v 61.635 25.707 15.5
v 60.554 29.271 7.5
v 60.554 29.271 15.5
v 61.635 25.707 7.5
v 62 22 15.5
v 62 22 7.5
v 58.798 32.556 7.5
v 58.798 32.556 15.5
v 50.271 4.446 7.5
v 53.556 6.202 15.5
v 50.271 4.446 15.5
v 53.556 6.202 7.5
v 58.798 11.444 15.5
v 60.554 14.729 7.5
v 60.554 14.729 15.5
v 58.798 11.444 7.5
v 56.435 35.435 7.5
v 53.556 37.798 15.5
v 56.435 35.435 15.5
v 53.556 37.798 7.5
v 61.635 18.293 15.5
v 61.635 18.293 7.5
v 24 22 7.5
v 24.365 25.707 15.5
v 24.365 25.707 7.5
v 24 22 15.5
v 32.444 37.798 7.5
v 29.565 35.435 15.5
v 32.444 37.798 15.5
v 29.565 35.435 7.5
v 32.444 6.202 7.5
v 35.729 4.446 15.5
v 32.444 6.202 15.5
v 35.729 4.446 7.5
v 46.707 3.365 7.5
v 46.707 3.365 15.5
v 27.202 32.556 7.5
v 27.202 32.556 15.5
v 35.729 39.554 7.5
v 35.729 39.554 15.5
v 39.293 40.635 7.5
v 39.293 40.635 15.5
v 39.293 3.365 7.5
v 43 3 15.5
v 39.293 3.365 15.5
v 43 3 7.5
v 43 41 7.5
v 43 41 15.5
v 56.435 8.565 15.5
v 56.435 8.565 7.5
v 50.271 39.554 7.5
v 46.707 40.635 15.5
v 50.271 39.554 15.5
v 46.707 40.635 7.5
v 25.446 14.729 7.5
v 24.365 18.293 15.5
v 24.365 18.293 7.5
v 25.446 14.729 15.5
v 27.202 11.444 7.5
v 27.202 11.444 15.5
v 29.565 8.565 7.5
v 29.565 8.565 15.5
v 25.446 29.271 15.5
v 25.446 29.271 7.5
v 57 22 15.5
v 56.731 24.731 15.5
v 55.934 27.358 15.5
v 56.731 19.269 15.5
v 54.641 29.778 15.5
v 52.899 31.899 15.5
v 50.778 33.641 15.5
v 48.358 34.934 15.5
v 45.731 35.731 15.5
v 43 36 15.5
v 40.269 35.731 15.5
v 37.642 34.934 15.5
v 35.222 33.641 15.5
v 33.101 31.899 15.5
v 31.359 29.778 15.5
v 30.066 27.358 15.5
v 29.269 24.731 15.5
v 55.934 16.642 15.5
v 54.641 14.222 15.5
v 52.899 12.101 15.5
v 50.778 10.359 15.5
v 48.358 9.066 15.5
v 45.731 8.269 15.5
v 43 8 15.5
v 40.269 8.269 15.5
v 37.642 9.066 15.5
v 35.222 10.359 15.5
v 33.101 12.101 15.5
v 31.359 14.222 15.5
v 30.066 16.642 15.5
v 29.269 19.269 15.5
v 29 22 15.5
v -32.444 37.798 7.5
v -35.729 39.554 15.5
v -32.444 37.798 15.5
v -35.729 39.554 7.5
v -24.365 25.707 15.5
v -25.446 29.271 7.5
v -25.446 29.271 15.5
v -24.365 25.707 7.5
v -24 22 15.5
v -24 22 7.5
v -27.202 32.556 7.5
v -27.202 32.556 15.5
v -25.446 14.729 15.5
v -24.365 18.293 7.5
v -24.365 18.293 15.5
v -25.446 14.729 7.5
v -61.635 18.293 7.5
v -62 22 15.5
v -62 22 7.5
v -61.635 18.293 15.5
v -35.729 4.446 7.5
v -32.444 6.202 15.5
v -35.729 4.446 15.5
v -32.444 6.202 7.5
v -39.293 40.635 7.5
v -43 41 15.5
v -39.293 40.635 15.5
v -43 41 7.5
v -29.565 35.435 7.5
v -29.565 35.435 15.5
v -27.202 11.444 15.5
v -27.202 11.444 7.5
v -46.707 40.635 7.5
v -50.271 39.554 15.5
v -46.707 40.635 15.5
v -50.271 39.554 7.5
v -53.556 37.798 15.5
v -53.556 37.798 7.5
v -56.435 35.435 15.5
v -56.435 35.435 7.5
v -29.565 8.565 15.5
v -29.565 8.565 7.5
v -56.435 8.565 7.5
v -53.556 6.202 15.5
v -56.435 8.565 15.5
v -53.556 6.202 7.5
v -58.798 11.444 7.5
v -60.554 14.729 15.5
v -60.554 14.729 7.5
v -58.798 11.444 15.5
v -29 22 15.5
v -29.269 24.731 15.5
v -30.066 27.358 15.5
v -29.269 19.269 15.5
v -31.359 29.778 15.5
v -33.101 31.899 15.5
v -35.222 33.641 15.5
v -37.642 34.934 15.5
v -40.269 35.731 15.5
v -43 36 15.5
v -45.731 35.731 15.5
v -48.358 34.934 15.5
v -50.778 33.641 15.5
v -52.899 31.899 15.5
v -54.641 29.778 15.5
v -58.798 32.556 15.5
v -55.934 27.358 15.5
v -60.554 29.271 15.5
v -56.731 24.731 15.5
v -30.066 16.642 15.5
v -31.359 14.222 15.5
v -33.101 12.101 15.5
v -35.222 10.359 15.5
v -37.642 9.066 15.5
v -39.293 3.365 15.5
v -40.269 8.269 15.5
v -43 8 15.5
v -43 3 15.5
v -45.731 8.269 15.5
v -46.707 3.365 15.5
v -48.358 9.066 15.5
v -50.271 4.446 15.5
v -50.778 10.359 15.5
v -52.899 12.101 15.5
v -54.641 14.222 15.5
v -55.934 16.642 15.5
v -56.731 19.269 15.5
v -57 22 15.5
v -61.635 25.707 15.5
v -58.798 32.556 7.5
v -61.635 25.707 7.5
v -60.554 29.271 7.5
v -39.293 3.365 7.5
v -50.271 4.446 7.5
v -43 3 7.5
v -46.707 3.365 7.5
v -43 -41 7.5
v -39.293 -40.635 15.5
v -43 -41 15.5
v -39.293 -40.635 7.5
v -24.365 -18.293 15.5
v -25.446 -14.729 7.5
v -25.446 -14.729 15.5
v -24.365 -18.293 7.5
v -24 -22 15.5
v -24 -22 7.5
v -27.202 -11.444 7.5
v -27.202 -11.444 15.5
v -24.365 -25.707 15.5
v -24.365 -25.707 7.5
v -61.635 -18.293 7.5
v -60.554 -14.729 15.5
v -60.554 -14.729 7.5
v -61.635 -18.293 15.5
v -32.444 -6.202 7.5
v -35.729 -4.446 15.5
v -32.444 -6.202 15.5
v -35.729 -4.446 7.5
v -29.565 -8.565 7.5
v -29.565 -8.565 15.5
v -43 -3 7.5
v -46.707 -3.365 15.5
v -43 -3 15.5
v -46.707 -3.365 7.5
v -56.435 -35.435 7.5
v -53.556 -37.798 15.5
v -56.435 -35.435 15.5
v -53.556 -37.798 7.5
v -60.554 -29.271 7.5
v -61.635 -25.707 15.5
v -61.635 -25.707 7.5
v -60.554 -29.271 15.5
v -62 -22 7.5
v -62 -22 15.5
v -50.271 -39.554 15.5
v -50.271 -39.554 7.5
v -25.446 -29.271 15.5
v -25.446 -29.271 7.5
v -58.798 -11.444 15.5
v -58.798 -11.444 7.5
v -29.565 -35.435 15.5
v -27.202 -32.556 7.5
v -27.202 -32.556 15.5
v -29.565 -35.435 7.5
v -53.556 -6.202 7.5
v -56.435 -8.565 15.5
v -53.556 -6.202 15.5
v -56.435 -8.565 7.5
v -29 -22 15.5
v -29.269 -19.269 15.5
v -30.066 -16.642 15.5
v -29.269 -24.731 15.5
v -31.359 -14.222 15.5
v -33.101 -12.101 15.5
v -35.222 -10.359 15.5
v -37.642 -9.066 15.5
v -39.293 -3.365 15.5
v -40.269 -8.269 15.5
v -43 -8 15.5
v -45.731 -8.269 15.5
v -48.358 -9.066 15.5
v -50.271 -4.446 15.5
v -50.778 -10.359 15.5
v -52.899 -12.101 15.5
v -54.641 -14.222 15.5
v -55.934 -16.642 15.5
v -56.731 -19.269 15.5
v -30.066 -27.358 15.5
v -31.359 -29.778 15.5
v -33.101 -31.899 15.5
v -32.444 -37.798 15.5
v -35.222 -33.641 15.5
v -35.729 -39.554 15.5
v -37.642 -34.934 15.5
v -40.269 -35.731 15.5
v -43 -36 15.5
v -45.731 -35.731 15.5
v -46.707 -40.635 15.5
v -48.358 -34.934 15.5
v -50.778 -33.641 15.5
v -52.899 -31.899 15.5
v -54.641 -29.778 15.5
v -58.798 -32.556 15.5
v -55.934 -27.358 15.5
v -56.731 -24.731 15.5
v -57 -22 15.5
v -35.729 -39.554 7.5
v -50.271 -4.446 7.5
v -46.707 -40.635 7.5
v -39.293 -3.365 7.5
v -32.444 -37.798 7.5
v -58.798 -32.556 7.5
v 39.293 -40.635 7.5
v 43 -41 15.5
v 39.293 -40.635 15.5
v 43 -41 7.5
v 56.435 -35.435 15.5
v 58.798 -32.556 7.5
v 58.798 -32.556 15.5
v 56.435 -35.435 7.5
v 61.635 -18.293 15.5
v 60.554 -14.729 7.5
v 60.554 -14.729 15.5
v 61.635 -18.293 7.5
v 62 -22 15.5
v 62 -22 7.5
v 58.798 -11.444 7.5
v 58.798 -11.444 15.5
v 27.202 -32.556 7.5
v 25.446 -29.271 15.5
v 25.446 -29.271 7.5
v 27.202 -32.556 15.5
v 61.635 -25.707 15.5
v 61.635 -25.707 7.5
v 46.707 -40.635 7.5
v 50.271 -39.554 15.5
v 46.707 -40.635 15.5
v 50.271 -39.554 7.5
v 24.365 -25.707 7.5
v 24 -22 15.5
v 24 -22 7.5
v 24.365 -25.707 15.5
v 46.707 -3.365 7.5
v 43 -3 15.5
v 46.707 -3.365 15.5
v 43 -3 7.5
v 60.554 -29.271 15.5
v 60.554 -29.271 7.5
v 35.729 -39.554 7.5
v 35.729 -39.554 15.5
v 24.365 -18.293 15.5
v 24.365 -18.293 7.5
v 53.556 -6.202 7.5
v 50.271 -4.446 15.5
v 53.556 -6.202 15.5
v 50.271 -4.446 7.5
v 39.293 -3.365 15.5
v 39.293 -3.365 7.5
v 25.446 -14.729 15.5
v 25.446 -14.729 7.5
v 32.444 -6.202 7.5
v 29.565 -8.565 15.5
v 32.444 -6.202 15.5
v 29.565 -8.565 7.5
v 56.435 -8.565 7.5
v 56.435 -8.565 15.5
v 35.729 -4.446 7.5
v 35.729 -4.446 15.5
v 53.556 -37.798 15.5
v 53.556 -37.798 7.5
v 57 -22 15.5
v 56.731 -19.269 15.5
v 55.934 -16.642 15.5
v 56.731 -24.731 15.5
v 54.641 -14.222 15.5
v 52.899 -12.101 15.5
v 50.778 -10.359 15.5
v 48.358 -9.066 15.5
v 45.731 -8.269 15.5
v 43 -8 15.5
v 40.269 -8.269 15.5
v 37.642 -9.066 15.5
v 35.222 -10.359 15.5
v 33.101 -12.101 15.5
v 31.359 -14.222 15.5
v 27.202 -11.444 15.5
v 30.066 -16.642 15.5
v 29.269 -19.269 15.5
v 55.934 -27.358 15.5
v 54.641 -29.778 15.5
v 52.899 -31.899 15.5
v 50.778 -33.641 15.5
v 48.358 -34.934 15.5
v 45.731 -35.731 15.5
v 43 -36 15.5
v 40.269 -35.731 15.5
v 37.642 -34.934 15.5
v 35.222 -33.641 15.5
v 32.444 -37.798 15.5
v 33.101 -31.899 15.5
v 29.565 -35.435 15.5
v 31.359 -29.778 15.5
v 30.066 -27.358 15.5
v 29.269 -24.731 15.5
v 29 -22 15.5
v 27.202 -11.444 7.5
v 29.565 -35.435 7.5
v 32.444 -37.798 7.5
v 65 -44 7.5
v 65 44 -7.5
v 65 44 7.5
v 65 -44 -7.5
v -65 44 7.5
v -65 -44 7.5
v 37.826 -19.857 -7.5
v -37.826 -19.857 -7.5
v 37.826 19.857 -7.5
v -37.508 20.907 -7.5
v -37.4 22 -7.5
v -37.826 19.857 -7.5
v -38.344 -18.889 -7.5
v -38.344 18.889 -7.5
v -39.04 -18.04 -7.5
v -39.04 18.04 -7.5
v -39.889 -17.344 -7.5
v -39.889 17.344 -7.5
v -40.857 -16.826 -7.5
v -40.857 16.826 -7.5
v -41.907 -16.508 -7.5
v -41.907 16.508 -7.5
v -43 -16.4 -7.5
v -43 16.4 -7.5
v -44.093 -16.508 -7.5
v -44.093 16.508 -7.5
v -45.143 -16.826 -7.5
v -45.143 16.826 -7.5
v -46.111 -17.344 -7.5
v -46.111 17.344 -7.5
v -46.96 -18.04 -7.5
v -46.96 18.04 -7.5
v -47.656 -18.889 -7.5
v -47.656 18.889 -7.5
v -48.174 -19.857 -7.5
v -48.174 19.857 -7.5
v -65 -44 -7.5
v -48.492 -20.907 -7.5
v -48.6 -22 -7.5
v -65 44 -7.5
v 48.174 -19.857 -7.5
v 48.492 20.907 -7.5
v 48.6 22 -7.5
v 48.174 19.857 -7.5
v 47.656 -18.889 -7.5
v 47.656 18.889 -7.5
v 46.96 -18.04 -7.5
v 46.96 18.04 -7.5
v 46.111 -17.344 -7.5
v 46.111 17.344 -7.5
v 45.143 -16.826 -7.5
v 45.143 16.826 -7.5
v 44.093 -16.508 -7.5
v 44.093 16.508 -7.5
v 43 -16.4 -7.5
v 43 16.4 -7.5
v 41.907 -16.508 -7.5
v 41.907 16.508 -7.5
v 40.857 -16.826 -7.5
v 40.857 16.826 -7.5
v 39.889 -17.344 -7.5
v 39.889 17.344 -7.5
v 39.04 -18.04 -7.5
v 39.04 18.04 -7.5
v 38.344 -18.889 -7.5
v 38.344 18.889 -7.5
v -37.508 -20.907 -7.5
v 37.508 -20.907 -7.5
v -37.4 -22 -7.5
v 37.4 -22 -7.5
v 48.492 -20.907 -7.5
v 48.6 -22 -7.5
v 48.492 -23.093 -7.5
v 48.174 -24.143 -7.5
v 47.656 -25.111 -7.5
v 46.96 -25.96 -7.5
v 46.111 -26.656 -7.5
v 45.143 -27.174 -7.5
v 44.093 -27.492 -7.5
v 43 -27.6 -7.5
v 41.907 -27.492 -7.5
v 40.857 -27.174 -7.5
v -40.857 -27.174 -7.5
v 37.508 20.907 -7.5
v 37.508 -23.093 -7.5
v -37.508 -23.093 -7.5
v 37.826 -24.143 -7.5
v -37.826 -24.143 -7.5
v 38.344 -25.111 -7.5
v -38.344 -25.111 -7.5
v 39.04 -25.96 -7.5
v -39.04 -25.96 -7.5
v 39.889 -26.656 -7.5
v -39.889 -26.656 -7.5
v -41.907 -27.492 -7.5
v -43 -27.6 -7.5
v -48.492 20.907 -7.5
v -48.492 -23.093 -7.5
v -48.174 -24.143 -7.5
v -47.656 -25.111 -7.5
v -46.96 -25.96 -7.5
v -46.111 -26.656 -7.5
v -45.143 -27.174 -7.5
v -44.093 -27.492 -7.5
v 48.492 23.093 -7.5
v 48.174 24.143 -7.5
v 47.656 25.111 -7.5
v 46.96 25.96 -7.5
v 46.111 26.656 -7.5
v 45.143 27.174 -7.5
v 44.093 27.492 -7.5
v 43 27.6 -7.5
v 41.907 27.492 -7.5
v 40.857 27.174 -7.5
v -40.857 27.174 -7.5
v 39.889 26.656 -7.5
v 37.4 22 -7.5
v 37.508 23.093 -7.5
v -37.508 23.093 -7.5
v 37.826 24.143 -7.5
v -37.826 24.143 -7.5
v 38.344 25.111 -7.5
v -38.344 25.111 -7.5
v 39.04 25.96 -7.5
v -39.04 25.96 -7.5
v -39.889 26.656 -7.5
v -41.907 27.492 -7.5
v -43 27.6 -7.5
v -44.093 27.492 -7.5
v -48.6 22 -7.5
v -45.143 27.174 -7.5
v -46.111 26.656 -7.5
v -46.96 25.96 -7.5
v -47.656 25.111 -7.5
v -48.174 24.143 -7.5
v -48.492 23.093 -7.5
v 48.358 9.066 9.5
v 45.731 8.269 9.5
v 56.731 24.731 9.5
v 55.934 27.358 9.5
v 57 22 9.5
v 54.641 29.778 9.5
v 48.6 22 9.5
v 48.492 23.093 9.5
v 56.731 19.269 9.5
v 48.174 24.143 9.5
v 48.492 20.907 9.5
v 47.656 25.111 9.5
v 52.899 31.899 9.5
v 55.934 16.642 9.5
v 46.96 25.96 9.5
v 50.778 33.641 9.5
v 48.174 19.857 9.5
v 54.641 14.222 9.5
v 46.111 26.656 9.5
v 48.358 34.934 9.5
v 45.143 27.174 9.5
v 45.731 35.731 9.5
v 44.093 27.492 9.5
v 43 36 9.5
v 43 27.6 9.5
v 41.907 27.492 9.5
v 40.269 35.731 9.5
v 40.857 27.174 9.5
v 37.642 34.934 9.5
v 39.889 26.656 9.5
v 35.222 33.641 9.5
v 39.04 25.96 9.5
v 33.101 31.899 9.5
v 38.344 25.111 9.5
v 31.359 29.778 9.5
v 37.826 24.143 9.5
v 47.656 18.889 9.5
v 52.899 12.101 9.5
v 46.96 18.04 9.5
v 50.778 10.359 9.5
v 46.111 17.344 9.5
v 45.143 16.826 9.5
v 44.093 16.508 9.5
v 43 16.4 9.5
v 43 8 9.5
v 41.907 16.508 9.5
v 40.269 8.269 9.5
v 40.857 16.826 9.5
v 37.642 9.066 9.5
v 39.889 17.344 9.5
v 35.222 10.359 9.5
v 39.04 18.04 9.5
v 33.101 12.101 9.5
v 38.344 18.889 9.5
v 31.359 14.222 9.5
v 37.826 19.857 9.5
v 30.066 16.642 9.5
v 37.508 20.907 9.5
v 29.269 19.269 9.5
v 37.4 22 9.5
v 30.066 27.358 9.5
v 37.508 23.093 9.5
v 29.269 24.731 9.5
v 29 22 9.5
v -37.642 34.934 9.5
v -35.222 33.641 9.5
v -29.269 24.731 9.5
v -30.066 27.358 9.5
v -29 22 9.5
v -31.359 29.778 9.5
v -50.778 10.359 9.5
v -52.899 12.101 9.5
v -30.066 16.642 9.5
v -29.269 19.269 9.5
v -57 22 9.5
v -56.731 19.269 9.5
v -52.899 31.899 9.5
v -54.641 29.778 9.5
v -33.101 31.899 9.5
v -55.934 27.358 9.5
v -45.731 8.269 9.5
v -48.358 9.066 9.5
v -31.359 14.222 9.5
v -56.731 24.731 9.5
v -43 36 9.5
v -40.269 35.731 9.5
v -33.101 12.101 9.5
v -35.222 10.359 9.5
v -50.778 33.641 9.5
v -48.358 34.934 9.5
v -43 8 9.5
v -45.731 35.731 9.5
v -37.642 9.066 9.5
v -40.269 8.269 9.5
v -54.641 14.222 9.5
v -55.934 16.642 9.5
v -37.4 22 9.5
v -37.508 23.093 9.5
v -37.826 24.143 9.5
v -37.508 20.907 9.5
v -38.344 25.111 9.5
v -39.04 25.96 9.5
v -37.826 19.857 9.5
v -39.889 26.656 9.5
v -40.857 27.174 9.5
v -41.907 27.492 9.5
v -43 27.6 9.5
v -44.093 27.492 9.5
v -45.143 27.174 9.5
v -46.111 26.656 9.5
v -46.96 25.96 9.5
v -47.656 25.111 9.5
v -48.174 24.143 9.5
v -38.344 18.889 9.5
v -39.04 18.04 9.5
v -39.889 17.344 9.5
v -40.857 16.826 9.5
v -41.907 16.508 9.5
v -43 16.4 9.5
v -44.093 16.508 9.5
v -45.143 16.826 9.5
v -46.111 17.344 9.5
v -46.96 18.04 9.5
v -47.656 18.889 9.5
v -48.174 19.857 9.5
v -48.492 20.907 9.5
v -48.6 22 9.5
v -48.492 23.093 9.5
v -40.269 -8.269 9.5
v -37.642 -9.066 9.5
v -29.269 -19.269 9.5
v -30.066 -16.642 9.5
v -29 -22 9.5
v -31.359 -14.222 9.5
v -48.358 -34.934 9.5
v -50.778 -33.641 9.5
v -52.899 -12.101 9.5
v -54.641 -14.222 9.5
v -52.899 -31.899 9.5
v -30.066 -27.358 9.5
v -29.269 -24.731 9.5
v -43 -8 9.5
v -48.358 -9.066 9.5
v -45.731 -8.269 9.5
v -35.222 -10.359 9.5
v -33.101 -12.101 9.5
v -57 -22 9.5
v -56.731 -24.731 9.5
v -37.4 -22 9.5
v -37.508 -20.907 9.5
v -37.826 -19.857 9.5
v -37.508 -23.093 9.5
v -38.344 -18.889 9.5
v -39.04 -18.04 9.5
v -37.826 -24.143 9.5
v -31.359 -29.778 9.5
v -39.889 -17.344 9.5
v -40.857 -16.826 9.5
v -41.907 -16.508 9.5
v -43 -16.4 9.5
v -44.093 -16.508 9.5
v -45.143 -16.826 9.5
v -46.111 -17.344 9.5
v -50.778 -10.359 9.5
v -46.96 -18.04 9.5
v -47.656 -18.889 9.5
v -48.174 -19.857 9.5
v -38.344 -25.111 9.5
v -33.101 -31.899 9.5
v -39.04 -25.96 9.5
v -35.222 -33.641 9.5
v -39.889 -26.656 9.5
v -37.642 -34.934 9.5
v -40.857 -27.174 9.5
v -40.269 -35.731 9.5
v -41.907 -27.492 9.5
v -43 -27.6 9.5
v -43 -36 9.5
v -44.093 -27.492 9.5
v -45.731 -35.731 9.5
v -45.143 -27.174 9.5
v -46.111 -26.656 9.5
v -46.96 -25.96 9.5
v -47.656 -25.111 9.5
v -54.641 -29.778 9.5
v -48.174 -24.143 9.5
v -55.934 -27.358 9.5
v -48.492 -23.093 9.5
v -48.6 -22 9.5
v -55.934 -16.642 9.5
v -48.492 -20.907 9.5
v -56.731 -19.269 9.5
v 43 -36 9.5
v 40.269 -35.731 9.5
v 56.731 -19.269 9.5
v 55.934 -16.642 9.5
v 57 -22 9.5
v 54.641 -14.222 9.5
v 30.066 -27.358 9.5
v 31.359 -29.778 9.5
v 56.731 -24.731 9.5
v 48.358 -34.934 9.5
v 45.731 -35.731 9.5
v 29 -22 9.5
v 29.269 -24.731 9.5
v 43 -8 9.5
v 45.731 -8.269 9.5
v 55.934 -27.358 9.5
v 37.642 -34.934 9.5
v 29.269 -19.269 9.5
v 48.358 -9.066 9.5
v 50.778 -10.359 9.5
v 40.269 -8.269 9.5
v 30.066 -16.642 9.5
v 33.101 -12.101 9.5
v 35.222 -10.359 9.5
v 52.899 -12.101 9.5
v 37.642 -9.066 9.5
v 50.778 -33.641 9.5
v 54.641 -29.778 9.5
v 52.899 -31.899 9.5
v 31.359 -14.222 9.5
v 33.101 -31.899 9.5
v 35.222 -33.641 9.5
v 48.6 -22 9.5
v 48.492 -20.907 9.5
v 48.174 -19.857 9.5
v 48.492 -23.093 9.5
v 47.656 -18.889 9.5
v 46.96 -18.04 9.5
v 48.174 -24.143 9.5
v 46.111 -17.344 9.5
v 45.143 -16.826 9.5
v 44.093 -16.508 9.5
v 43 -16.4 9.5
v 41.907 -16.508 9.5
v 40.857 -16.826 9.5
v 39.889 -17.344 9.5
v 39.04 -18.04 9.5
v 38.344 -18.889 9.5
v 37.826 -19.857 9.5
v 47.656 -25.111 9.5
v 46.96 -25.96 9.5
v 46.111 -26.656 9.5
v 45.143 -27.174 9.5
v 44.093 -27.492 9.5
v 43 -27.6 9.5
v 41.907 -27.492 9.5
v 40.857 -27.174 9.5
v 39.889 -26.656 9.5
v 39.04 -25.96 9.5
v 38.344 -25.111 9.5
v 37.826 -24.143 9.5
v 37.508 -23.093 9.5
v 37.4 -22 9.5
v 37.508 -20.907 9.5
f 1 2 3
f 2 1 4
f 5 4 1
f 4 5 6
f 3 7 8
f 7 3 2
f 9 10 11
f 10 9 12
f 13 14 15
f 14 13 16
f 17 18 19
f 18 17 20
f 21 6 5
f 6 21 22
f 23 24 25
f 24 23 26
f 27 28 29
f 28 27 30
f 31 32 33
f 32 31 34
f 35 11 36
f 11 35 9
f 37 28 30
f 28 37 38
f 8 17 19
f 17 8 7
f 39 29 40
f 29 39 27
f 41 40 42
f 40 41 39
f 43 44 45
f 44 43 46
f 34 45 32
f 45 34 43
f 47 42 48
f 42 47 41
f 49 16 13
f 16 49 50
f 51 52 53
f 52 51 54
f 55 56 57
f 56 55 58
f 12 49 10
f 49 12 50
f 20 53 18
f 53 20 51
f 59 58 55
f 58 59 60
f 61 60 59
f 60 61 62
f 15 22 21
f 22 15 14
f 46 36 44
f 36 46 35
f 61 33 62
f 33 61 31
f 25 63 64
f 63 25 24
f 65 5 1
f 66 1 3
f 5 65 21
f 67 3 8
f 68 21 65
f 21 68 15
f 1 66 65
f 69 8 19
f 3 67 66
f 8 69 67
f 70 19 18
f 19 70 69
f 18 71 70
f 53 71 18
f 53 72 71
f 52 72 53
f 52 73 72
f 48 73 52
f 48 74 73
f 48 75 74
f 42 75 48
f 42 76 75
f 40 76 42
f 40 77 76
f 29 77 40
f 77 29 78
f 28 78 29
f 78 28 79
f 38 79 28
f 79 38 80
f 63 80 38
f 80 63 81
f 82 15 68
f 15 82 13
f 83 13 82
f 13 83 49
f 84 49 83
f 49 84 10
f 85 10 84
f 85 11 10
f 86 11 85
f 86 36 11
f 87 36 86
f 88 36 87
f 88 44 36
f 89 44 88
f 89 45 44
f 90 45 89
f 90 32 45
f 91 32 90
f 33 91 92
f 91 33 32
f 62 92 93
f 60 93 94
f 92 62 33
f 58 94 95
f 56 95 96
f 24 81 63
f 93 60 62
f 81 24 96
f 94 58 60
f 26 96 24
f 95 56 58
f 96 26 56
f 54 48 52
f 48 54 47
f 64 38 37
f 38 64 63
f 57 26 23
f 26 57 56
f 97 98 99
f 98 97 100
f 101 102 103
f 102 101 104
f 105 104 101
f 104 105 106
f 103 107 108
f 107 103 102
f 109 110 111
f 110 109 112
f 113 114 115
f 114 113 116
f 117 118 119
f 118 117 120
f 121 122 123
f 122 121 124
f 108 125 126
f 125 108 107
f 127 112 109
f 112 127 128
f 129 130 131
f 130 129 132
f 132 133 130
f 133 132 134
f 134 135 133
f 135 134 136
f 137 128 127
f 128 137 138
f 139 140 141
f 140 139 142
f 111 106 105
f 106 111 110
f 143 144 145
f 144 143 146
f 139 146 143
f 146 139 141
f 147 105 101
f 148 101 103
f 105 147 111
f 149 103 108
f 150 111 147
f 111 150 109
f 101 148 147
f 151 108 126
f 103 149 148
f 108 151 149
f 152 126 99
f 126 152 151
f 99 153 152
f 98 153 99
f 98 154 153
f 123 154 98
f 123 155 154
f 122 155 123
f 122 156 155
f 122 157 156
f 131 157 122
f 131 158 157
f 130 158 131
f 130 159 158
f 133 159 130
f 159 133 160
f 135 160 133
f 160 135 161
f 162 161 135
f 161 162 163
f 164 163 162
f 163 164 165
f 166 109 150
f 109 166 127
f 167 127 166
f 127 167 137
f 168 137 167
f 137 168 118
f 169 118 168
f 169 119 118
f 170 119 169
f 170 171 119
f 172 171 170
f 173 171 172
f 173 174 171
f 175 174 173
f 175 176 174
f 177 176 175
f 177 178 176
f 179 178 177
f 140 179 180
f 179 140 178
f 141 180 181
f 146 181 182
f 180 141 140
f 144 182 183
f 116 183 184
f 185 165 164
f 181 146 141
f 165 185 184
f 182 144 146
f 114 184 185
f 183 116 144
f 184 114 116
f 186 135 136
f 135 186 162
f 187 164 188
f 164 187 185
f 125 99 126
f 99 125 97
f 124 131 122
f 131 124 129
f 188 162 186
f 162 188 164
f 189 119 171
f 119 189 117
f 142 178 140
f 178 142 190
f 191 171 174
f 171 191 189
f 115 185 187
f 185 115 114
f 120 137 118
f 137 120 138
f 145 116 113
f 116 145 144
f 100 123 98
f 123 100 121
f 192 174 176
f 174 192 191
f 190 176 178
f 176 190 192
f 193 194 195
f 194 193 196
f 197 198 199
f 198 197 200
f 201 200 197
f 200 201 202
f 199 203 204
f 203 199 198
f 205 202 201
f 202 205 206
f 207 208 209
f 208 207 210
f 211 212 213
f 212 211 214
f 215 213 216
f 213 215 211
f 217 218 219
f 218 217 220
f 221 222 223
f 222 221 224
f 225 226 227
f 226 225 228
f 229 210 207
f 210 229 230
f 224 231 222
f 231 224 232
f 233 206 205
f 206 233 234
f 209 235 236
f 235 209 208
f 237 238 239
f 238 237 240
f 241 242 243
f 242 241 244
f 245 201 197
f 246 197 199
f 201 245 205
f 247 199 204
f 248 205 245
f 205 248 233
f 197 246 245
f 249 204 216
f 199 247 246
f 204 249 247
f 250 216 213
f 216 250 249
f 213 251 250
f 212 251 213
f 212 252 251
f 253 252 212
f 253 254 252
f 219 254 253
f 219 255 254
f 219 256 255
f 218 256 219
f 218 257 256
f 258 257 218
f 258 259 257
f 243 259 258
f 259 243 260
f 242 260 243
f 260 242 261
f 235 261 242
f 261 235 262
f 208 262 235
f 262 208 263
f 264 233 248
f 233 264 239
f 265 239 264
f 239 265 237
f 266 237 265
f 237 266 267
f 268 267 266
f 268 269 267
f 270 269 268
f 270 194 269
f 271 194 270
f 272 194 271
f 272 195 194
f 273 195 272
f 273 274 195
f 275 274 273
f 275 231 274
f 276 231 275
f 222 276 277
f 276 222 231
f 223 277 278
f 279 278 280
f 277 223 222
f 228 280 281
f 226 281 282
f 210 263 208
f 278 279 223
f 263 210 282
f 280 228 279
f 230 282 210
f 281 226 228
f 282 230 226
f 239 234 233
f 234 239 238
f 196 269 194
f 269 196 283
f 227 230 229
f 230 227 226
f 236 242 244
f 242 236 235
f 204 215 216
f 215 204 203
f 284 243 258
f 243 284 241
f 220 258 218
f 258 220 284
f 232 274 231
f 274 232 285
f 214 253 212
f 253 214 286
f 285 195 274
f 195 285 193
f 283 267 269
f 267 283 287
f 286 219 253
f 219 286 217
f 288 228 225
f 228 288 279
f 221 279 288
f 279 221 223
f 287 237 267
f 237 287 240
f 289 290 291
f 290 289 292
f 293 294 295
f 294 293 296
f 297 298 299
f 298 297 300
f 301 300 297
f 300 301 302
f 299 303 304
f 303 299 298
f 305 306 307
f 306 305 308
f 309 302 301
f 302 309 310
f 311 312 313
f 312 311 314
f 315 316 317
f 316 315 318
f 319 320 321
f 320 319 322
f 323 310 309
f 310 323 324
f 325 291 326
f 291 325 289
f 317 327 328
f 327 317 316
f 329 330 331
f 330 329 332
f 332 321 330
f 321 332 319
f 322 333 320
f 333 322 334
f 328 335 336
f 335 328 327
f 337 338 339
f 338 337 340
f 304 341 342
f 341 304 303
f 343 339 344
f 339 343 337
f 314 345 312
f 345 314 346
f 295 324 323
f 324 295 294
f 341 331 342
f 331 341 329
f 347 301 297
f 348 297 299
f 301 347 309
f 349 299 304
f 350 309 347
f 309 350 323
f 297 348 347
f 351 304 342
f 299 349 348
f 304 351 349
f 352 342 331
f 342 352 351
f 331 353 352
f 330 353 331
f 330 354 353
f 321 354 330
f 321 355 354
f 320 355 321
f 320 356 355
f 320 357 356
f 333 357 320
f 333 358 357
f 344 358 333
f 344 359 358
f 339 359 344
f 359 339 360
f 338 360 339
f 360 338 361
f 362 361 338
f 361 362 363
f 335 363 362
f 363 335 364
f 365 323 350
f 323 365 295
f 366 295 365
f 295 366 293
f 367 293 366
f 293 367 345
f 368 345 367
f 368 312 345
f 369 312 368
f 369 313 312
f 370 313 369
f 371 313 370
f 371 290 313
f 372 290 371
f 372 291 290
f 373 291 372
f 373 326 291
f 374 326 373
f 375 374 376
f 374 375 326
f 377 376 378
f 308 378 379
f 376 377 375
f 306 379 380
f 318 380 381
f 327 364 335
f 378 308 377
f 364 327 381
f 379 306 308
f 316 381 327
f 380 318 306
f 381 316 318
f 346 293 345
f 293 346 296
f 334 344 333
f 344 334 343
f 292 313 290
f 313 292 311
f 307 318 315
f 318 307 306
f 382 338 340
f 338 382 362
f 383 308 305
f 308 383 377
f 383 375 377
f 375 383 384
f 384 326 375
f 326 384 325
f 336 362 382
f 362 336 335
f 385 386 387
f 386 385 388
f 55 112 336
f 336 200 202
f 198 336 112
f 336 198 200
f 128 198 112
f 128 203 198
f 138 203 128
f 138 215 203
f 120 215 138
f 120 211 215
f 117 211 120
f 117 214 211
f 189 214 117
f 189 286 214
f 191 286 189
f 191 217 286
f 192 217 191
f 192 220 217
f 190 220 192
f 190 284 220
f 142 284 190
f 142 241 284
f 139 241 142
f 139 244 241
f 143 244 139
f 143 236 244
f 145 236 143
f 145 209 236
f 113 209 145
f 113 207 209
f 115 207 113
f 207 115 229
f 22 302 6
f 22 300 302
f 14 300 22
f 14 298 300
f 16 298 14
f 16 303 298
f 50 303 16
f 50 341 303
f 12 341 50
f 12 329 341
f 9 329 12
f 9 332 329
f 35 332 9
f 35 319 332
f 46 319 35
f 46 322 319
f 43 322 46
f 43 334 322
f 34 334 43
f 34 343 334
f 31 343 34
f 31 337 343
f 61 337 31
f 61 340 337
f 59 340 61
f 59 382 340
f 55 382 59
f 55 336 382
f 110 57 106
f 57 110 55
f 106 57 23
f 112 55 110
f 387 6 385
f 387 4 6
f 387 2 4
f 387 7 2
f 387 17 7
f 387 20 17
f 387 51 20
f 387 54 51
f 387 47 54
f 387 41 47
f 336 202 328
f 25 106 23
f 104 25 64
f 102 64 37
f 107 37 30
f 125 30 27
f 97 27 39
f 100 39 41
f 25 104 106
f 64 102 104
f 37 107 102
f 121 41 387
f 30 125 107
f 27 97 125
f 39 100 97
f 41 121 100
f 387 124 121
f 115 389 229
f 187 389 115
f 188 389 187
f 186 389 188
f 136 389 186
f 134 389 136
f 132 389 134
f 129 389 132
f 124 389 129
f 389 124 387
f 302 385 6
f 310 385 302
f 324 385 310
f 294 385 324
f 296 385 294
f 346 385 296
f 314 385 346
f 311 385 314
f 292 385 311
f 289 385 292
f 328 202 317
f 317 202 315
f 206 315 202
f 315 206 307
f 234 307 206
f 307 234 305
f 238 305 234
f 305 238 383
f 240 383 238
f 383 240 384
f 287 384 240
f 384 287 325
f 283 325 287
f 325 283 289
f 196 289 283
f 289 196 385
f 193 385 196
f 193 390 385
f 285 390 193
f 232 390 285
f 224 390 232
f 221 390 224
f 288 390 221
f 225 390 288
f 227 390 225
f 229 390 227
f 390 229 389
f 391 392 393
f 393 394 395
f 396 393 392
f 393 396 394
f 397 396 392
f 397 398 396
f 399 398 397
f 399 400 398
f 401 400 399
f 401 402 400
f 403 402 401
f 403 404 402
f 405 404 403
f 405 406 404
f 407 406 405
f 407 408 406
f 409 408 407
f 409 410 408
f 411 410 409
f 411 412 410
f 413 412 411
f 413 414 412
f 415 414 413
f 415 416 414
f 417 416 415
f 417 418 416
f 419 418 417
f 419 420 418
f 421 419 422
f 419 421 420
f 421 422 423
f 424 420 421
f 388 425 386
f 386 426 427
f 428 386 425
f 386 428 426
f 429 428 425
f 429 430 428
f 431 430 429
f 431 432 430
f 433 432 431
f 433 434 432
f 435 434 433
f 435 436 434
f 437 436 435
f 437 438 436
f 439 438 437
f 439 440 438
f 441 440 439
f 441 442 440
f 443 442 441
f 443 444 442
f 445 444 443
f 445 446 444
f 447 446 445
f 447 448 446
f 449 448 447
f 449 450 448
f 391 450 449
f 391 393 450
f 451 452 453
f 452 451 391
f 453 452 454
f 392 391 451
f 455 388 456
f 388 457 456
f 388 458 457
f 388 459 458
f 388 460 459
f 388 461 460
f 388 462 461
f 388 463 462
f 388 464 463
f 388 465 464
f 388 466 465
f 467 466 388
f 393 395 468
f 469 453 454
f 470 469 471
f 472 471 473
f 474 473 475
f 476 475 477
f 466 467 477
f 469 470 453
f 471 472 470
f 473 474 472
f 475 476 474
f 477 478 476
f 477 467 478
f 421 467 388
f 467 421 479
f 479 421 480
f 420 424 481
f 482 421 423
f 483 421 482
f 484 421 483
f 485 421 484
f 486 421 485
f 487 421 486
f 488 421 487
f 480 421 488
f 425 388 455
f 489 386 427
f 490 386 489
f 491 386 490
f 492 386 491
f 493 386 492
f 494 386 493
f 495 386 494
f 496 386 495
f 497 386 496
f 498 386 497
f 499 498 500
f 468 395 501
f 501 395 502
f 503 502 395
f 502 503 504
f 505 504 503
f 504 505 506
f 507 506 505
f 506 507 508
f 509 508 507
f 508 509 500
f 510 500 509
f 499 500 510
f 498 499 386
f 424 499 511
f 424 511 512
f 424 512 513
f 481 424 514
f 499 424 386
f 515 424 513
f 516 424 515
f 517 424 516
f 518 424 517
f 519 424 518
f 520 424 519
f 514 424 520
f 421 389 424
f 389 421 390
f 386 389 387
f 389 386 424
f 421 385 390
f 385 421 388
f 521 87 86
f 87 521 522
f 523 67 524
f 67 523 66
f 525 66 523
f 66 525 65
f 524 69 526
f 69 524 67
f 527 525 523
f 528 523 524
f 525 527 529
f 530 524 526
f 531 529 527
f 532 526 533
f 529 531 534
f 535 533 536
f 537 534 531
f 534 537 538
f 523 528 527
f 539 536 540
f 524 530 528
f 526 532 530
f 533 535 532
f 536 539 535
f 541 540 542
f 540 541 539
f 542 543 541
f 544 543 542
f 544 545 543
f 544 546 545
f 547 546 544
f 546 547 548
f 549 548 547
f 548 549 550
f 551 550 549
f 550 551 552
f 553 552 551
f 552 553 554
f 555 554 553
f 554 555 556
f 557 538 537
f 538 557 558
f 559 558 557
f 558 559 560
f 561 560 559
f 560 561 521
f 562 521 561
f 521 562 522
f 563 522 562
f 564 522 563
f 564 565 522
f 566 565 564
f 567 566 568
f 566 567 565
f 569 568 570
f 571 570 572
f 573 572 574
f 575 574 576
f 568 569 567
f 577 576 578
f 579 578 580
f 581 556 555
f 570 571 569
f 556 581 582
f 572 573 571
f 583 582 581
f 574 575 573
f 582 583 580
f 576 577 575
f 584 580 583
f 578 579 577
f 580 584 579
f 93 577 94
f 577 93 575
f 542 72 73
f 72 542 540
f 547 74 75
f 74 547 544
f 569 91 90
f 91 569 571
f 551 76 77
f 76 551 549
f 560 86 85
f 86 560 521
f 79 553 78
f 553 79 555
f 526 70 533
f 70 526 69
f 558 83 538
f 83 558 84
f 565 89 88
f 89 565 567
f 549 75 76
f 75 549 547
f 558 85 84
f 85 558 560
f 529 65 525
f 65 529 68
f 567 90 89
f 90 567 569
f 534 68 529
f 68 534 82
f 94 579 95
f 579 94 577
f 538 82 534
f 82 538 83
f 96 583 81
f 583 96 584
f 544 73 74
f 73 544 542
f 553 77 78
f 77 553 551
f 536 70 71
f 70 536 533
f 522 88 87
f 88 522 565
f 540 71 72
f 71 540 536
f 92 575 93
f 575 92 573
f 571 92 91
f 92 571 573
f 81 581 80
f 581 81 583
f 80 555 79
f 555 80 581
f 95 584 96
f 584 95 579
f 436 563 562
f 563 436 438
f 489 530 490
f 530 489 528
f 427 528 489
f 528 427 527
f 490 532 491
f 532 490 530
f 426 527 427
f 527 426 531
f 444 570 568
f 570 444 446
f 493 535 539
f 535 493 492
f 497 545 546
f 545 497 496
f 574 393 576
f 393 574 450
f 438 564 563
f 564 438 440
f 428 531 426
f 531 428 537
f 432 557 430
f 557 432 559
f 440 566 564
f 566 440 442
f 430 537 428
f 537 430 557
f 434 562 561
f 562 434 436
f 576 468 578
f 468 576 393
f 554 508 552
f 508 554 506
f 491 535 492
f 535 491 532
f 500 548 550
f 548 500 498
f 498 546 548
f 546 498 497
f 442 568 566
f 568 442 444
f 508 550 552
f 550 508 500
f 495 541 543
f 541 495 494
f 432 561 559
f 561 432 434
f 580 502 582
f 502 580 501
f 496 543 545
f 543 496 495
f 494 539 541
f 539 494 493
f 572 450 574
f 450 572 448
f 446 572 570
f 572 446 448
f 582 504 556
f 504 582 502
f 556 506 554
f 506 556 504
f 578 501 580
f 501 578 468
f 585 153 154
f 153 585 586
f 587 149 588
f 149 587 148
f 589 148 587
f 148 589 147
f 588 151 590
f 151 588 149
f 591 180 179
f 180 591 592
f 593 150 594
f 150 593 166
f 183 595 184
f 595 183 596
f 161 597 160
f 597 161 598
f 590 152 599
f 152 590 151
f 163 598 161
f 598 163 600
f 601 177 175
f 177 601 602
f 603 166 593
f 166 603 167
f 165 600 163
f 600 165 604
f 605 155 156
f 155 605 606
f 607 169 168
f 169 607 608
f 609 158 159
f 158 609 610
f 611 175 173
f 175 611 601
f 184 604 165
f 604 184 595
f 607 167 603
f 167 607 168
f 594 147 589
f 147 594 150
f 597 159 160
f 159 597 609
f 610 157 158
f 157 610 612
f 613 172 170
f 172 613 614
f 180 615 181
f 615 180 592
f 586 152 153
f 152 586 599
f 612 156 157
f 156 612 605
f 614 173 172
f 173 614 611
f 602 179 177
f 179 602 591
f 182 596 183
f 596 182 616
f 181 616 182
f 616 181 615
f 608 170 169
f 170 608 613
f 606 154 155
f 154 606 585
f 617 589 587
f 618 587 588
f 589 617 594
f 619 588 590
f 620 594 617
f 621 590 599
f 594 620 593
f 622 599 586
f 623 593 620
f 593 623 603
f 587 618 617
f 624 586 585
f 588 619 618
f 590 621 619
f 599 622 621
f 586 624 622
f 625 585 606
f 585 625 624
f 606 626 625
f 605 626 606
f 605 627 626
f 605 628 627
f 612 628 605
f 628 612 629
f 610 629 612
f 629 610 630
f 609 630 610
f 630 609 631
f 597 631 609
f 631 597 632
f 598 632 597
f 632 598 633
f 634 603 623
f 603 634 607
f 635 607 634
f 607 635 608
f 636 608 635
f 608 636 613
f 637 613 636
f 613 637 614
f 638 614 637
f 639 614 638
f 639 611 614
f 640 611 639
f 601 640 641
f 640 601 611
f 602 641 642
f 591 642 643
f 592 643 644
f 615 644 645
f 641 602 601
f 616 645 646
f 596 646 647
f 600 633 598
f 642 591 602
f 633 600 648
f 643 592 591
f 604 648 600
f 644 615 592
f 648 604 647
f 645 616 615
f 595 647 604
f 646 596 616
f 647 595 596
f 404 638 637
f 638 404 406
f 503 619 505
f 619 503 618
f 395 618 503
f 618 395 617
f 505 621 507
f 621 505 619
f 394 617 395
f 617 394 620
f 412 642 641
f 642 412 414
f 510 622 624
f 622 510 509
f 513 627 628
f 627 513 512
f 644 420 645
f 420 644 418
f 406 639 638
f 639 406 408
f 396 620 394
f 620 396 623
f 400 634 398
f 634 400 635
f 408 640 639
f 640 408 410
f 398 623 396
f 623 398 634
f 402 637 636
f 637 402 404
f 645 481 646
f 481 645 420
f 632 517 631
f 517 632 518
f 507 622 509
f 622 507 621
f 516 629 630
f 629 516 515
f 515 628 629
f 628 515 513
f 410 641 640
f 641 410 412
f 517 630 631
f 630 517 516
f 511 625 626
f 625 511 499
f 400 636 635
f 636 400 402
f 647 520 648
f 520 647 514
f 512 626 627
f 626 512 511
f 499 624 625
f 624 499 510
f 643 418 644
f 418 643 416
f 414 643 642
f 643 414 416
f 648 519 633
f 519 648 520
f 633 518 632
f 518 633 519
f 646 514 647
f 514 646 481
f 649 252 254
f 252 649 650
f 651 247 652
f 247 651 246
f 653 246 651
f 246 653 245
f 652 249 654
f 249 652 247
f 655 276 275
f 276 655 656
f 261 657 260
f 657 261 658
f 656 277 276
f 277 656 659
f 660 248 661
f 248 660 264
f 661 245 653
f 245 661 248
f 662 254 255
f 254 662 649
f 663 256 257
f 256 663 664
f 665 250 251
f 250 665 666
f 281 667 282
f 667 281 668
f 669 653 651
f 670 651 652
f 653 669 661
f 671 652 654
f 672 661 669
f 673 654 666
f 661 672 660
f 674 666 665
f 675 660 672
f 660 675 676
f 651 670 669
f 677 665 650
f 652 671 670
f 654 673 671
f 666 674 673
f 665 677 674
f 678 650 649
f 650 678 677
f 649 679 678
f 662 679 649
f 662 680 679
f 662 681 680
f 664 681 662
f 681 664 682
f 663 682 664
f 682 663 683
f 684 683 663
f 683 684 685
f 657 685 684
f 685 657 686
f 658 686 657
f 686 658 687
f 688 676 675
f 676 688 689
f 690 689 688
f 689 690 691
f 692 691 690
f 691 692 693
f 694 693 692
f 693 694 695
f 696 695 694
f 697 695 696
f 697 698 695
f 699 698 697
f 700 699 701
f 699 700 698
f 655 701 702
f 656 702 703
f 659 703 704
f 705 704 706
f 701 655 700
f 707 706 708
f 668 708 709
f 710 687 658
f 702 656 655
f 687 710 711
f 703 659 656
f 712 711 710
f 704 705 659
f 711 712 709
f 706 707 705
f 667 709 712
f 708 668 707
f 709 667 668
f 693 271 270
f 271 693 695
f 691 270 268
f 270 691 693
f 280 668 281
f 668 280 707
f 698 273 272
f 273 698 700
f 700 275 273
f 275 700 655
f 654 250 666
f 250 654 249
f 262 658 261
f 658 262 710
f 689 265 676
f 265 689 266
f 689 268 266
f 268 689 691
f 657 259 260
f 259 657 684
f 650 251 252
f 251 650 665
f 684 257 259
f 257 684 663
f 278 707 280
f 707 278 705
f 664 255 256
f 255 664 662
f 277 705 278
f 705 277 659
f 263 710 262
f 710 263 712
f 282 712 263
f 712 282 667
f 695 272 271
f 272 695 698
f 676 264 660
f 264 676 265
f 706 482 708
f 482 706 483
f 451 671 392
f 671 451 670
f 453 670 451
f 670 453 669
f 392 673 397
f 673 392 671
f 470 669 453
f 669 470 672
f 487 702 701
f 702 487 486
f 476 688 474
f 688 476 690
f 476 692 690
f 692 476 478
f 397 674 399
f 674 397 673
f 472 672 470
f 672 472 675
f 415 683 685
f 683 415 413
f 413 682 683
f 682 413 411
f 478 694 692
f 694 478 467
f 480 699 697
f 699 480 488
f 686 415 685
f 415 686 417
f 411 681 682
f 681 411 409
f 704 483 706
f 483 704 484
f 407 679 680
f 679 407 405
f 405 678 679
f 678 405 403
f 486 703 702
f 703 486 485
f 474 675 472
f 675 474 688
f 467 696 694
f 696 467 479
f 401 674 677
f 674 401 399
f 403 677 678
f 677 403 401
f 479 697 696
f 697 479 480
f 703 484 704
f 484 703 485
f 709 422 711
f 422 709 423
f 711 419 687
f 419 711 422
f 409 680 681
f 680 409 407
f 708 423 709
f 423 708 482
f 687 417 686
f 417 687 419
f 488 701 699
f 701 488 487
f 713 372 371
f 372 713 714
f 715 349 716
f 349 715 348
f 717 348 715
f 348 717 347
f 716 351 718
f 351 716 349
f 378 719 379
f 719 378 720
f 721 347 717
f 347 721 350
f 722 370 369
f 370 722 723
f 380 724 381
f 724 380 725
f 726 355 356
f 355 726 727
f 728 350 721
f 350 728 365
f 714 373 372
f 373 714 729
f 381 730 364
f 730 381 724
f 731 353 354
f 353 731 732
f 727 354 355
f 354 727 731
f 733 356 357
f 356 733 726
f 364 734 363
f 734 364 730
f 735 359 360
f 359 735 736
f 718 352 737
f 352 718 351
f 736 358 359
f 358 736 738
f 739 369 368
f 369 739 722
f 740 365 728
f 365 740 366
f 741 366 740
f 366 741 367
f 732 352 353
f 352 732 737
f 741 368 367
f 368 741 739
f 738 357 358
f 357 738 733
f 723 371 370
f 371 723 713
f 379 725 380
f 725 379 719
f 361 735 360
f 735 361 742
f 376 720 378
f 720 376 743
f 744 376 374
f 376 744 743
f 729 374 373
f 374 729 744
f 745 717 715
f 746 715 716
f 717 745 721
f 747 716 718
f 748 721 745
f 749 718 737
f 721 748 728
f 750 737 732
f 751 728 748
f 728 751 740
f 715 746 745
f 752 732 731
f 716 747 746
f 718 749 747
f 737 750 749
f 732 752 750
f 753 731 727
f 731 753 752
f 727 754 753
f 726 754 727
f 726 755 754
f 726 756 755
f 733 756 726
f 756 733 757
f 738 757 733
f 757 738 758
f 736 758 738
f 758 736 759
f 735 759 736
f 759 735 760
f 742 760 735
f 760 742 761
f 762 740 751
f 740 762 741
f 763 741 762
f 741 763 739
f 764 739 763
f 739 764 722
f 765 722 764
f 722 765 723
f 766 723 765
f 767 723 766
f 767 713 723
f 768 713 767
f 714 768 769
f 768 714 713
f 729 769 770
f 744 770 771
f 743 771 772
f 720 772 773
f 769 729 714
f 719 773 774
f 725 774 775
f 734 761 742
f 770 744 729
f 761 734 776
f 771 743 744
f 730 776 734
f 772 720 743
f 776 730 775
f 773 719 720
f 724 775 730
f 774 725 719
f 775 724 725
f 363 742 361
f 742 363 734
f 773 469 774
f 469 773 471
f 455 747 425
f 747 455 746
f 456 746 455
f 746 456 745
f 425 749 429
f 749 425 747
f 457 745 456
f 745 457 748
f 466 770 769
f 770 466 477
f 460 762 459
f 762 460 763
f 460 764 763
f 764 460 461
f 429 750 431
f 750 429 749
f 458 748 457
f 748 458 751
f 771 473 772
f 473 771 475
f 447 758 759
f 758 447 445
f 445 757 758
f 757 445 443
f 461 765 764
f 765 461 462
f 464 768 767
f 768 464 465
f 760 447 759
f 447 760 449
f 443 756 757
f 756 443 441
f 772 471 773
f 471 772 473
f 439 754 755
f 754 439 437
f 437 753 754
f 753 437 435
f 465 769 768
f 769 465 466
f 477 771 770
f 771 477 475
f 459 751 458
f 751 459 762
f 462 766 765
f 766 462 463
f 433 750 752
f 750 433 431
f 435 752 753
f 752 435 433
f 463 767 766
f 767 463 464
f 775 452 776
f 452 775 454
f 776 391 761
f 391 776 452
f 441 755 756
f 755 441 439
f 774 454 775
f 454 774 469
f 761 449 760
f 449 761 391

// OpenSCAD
$fn = 32;

// ----------------------------------------------------------------------
// Socket pad plate
// bosses with counterbored sockets for the screws
// ----------------------------------------------------------------------

// --- parameters (mm) ---
base_t = 15;            // base plate thickness
boss_h = 8;             // boss height above the base plate
boss_d = 38;            // boss diameter
socket_d = 28;          // socket diameter
socket_depth = 6;       // socket depth from the boss face
bolt_d = 11.2;          // screw clearance hole through the socket floor
plate = [130, 88, 15];  // overall size (x, y, z)
edge = 22;              // boss centre offset from the plate edge
pads = 4;               // boss count, one per corner

// --- derived feature positions (mm) ---
height = base_t + boss_h;        // = 23   overall height of the part
corner_x = plate[0] / 2 - edge;  // = 43   boss centre X
corner_y = plate[1] / 2 - edge;  // = 22   boss centre Y
feature_centers = [
  [corner_x, corner_y],
  [-corner_x, corner_y],
  [-corner_x, -corner_y],
  [corner_x, -corner_y]
];   // boss centres: sockets, holes and the pads themselves are placed from here

// base plate, bosses on feature_centers, socket + through hole in each
difference() {
  union() {
    cube(plate, center = true);
    for (centre = feature_centers)
      translate([centre[0], centre[1], plate[2] / 2 - 1])
        cylinder(d = boss_d, h = boss_h + 1);
  }
  for (centre = feature_centers) {
    translate([centre[0], centre[1], plate[2] / 2 + boss_h - socket_depth])
      cylinder(d = socket_d, h = socket_depth + 1);
    translate([centre[0], centre[1], -height])
      cylinder(d = bolt_d, h = 2 * height + 2);  // through the socket floor
  }
}
